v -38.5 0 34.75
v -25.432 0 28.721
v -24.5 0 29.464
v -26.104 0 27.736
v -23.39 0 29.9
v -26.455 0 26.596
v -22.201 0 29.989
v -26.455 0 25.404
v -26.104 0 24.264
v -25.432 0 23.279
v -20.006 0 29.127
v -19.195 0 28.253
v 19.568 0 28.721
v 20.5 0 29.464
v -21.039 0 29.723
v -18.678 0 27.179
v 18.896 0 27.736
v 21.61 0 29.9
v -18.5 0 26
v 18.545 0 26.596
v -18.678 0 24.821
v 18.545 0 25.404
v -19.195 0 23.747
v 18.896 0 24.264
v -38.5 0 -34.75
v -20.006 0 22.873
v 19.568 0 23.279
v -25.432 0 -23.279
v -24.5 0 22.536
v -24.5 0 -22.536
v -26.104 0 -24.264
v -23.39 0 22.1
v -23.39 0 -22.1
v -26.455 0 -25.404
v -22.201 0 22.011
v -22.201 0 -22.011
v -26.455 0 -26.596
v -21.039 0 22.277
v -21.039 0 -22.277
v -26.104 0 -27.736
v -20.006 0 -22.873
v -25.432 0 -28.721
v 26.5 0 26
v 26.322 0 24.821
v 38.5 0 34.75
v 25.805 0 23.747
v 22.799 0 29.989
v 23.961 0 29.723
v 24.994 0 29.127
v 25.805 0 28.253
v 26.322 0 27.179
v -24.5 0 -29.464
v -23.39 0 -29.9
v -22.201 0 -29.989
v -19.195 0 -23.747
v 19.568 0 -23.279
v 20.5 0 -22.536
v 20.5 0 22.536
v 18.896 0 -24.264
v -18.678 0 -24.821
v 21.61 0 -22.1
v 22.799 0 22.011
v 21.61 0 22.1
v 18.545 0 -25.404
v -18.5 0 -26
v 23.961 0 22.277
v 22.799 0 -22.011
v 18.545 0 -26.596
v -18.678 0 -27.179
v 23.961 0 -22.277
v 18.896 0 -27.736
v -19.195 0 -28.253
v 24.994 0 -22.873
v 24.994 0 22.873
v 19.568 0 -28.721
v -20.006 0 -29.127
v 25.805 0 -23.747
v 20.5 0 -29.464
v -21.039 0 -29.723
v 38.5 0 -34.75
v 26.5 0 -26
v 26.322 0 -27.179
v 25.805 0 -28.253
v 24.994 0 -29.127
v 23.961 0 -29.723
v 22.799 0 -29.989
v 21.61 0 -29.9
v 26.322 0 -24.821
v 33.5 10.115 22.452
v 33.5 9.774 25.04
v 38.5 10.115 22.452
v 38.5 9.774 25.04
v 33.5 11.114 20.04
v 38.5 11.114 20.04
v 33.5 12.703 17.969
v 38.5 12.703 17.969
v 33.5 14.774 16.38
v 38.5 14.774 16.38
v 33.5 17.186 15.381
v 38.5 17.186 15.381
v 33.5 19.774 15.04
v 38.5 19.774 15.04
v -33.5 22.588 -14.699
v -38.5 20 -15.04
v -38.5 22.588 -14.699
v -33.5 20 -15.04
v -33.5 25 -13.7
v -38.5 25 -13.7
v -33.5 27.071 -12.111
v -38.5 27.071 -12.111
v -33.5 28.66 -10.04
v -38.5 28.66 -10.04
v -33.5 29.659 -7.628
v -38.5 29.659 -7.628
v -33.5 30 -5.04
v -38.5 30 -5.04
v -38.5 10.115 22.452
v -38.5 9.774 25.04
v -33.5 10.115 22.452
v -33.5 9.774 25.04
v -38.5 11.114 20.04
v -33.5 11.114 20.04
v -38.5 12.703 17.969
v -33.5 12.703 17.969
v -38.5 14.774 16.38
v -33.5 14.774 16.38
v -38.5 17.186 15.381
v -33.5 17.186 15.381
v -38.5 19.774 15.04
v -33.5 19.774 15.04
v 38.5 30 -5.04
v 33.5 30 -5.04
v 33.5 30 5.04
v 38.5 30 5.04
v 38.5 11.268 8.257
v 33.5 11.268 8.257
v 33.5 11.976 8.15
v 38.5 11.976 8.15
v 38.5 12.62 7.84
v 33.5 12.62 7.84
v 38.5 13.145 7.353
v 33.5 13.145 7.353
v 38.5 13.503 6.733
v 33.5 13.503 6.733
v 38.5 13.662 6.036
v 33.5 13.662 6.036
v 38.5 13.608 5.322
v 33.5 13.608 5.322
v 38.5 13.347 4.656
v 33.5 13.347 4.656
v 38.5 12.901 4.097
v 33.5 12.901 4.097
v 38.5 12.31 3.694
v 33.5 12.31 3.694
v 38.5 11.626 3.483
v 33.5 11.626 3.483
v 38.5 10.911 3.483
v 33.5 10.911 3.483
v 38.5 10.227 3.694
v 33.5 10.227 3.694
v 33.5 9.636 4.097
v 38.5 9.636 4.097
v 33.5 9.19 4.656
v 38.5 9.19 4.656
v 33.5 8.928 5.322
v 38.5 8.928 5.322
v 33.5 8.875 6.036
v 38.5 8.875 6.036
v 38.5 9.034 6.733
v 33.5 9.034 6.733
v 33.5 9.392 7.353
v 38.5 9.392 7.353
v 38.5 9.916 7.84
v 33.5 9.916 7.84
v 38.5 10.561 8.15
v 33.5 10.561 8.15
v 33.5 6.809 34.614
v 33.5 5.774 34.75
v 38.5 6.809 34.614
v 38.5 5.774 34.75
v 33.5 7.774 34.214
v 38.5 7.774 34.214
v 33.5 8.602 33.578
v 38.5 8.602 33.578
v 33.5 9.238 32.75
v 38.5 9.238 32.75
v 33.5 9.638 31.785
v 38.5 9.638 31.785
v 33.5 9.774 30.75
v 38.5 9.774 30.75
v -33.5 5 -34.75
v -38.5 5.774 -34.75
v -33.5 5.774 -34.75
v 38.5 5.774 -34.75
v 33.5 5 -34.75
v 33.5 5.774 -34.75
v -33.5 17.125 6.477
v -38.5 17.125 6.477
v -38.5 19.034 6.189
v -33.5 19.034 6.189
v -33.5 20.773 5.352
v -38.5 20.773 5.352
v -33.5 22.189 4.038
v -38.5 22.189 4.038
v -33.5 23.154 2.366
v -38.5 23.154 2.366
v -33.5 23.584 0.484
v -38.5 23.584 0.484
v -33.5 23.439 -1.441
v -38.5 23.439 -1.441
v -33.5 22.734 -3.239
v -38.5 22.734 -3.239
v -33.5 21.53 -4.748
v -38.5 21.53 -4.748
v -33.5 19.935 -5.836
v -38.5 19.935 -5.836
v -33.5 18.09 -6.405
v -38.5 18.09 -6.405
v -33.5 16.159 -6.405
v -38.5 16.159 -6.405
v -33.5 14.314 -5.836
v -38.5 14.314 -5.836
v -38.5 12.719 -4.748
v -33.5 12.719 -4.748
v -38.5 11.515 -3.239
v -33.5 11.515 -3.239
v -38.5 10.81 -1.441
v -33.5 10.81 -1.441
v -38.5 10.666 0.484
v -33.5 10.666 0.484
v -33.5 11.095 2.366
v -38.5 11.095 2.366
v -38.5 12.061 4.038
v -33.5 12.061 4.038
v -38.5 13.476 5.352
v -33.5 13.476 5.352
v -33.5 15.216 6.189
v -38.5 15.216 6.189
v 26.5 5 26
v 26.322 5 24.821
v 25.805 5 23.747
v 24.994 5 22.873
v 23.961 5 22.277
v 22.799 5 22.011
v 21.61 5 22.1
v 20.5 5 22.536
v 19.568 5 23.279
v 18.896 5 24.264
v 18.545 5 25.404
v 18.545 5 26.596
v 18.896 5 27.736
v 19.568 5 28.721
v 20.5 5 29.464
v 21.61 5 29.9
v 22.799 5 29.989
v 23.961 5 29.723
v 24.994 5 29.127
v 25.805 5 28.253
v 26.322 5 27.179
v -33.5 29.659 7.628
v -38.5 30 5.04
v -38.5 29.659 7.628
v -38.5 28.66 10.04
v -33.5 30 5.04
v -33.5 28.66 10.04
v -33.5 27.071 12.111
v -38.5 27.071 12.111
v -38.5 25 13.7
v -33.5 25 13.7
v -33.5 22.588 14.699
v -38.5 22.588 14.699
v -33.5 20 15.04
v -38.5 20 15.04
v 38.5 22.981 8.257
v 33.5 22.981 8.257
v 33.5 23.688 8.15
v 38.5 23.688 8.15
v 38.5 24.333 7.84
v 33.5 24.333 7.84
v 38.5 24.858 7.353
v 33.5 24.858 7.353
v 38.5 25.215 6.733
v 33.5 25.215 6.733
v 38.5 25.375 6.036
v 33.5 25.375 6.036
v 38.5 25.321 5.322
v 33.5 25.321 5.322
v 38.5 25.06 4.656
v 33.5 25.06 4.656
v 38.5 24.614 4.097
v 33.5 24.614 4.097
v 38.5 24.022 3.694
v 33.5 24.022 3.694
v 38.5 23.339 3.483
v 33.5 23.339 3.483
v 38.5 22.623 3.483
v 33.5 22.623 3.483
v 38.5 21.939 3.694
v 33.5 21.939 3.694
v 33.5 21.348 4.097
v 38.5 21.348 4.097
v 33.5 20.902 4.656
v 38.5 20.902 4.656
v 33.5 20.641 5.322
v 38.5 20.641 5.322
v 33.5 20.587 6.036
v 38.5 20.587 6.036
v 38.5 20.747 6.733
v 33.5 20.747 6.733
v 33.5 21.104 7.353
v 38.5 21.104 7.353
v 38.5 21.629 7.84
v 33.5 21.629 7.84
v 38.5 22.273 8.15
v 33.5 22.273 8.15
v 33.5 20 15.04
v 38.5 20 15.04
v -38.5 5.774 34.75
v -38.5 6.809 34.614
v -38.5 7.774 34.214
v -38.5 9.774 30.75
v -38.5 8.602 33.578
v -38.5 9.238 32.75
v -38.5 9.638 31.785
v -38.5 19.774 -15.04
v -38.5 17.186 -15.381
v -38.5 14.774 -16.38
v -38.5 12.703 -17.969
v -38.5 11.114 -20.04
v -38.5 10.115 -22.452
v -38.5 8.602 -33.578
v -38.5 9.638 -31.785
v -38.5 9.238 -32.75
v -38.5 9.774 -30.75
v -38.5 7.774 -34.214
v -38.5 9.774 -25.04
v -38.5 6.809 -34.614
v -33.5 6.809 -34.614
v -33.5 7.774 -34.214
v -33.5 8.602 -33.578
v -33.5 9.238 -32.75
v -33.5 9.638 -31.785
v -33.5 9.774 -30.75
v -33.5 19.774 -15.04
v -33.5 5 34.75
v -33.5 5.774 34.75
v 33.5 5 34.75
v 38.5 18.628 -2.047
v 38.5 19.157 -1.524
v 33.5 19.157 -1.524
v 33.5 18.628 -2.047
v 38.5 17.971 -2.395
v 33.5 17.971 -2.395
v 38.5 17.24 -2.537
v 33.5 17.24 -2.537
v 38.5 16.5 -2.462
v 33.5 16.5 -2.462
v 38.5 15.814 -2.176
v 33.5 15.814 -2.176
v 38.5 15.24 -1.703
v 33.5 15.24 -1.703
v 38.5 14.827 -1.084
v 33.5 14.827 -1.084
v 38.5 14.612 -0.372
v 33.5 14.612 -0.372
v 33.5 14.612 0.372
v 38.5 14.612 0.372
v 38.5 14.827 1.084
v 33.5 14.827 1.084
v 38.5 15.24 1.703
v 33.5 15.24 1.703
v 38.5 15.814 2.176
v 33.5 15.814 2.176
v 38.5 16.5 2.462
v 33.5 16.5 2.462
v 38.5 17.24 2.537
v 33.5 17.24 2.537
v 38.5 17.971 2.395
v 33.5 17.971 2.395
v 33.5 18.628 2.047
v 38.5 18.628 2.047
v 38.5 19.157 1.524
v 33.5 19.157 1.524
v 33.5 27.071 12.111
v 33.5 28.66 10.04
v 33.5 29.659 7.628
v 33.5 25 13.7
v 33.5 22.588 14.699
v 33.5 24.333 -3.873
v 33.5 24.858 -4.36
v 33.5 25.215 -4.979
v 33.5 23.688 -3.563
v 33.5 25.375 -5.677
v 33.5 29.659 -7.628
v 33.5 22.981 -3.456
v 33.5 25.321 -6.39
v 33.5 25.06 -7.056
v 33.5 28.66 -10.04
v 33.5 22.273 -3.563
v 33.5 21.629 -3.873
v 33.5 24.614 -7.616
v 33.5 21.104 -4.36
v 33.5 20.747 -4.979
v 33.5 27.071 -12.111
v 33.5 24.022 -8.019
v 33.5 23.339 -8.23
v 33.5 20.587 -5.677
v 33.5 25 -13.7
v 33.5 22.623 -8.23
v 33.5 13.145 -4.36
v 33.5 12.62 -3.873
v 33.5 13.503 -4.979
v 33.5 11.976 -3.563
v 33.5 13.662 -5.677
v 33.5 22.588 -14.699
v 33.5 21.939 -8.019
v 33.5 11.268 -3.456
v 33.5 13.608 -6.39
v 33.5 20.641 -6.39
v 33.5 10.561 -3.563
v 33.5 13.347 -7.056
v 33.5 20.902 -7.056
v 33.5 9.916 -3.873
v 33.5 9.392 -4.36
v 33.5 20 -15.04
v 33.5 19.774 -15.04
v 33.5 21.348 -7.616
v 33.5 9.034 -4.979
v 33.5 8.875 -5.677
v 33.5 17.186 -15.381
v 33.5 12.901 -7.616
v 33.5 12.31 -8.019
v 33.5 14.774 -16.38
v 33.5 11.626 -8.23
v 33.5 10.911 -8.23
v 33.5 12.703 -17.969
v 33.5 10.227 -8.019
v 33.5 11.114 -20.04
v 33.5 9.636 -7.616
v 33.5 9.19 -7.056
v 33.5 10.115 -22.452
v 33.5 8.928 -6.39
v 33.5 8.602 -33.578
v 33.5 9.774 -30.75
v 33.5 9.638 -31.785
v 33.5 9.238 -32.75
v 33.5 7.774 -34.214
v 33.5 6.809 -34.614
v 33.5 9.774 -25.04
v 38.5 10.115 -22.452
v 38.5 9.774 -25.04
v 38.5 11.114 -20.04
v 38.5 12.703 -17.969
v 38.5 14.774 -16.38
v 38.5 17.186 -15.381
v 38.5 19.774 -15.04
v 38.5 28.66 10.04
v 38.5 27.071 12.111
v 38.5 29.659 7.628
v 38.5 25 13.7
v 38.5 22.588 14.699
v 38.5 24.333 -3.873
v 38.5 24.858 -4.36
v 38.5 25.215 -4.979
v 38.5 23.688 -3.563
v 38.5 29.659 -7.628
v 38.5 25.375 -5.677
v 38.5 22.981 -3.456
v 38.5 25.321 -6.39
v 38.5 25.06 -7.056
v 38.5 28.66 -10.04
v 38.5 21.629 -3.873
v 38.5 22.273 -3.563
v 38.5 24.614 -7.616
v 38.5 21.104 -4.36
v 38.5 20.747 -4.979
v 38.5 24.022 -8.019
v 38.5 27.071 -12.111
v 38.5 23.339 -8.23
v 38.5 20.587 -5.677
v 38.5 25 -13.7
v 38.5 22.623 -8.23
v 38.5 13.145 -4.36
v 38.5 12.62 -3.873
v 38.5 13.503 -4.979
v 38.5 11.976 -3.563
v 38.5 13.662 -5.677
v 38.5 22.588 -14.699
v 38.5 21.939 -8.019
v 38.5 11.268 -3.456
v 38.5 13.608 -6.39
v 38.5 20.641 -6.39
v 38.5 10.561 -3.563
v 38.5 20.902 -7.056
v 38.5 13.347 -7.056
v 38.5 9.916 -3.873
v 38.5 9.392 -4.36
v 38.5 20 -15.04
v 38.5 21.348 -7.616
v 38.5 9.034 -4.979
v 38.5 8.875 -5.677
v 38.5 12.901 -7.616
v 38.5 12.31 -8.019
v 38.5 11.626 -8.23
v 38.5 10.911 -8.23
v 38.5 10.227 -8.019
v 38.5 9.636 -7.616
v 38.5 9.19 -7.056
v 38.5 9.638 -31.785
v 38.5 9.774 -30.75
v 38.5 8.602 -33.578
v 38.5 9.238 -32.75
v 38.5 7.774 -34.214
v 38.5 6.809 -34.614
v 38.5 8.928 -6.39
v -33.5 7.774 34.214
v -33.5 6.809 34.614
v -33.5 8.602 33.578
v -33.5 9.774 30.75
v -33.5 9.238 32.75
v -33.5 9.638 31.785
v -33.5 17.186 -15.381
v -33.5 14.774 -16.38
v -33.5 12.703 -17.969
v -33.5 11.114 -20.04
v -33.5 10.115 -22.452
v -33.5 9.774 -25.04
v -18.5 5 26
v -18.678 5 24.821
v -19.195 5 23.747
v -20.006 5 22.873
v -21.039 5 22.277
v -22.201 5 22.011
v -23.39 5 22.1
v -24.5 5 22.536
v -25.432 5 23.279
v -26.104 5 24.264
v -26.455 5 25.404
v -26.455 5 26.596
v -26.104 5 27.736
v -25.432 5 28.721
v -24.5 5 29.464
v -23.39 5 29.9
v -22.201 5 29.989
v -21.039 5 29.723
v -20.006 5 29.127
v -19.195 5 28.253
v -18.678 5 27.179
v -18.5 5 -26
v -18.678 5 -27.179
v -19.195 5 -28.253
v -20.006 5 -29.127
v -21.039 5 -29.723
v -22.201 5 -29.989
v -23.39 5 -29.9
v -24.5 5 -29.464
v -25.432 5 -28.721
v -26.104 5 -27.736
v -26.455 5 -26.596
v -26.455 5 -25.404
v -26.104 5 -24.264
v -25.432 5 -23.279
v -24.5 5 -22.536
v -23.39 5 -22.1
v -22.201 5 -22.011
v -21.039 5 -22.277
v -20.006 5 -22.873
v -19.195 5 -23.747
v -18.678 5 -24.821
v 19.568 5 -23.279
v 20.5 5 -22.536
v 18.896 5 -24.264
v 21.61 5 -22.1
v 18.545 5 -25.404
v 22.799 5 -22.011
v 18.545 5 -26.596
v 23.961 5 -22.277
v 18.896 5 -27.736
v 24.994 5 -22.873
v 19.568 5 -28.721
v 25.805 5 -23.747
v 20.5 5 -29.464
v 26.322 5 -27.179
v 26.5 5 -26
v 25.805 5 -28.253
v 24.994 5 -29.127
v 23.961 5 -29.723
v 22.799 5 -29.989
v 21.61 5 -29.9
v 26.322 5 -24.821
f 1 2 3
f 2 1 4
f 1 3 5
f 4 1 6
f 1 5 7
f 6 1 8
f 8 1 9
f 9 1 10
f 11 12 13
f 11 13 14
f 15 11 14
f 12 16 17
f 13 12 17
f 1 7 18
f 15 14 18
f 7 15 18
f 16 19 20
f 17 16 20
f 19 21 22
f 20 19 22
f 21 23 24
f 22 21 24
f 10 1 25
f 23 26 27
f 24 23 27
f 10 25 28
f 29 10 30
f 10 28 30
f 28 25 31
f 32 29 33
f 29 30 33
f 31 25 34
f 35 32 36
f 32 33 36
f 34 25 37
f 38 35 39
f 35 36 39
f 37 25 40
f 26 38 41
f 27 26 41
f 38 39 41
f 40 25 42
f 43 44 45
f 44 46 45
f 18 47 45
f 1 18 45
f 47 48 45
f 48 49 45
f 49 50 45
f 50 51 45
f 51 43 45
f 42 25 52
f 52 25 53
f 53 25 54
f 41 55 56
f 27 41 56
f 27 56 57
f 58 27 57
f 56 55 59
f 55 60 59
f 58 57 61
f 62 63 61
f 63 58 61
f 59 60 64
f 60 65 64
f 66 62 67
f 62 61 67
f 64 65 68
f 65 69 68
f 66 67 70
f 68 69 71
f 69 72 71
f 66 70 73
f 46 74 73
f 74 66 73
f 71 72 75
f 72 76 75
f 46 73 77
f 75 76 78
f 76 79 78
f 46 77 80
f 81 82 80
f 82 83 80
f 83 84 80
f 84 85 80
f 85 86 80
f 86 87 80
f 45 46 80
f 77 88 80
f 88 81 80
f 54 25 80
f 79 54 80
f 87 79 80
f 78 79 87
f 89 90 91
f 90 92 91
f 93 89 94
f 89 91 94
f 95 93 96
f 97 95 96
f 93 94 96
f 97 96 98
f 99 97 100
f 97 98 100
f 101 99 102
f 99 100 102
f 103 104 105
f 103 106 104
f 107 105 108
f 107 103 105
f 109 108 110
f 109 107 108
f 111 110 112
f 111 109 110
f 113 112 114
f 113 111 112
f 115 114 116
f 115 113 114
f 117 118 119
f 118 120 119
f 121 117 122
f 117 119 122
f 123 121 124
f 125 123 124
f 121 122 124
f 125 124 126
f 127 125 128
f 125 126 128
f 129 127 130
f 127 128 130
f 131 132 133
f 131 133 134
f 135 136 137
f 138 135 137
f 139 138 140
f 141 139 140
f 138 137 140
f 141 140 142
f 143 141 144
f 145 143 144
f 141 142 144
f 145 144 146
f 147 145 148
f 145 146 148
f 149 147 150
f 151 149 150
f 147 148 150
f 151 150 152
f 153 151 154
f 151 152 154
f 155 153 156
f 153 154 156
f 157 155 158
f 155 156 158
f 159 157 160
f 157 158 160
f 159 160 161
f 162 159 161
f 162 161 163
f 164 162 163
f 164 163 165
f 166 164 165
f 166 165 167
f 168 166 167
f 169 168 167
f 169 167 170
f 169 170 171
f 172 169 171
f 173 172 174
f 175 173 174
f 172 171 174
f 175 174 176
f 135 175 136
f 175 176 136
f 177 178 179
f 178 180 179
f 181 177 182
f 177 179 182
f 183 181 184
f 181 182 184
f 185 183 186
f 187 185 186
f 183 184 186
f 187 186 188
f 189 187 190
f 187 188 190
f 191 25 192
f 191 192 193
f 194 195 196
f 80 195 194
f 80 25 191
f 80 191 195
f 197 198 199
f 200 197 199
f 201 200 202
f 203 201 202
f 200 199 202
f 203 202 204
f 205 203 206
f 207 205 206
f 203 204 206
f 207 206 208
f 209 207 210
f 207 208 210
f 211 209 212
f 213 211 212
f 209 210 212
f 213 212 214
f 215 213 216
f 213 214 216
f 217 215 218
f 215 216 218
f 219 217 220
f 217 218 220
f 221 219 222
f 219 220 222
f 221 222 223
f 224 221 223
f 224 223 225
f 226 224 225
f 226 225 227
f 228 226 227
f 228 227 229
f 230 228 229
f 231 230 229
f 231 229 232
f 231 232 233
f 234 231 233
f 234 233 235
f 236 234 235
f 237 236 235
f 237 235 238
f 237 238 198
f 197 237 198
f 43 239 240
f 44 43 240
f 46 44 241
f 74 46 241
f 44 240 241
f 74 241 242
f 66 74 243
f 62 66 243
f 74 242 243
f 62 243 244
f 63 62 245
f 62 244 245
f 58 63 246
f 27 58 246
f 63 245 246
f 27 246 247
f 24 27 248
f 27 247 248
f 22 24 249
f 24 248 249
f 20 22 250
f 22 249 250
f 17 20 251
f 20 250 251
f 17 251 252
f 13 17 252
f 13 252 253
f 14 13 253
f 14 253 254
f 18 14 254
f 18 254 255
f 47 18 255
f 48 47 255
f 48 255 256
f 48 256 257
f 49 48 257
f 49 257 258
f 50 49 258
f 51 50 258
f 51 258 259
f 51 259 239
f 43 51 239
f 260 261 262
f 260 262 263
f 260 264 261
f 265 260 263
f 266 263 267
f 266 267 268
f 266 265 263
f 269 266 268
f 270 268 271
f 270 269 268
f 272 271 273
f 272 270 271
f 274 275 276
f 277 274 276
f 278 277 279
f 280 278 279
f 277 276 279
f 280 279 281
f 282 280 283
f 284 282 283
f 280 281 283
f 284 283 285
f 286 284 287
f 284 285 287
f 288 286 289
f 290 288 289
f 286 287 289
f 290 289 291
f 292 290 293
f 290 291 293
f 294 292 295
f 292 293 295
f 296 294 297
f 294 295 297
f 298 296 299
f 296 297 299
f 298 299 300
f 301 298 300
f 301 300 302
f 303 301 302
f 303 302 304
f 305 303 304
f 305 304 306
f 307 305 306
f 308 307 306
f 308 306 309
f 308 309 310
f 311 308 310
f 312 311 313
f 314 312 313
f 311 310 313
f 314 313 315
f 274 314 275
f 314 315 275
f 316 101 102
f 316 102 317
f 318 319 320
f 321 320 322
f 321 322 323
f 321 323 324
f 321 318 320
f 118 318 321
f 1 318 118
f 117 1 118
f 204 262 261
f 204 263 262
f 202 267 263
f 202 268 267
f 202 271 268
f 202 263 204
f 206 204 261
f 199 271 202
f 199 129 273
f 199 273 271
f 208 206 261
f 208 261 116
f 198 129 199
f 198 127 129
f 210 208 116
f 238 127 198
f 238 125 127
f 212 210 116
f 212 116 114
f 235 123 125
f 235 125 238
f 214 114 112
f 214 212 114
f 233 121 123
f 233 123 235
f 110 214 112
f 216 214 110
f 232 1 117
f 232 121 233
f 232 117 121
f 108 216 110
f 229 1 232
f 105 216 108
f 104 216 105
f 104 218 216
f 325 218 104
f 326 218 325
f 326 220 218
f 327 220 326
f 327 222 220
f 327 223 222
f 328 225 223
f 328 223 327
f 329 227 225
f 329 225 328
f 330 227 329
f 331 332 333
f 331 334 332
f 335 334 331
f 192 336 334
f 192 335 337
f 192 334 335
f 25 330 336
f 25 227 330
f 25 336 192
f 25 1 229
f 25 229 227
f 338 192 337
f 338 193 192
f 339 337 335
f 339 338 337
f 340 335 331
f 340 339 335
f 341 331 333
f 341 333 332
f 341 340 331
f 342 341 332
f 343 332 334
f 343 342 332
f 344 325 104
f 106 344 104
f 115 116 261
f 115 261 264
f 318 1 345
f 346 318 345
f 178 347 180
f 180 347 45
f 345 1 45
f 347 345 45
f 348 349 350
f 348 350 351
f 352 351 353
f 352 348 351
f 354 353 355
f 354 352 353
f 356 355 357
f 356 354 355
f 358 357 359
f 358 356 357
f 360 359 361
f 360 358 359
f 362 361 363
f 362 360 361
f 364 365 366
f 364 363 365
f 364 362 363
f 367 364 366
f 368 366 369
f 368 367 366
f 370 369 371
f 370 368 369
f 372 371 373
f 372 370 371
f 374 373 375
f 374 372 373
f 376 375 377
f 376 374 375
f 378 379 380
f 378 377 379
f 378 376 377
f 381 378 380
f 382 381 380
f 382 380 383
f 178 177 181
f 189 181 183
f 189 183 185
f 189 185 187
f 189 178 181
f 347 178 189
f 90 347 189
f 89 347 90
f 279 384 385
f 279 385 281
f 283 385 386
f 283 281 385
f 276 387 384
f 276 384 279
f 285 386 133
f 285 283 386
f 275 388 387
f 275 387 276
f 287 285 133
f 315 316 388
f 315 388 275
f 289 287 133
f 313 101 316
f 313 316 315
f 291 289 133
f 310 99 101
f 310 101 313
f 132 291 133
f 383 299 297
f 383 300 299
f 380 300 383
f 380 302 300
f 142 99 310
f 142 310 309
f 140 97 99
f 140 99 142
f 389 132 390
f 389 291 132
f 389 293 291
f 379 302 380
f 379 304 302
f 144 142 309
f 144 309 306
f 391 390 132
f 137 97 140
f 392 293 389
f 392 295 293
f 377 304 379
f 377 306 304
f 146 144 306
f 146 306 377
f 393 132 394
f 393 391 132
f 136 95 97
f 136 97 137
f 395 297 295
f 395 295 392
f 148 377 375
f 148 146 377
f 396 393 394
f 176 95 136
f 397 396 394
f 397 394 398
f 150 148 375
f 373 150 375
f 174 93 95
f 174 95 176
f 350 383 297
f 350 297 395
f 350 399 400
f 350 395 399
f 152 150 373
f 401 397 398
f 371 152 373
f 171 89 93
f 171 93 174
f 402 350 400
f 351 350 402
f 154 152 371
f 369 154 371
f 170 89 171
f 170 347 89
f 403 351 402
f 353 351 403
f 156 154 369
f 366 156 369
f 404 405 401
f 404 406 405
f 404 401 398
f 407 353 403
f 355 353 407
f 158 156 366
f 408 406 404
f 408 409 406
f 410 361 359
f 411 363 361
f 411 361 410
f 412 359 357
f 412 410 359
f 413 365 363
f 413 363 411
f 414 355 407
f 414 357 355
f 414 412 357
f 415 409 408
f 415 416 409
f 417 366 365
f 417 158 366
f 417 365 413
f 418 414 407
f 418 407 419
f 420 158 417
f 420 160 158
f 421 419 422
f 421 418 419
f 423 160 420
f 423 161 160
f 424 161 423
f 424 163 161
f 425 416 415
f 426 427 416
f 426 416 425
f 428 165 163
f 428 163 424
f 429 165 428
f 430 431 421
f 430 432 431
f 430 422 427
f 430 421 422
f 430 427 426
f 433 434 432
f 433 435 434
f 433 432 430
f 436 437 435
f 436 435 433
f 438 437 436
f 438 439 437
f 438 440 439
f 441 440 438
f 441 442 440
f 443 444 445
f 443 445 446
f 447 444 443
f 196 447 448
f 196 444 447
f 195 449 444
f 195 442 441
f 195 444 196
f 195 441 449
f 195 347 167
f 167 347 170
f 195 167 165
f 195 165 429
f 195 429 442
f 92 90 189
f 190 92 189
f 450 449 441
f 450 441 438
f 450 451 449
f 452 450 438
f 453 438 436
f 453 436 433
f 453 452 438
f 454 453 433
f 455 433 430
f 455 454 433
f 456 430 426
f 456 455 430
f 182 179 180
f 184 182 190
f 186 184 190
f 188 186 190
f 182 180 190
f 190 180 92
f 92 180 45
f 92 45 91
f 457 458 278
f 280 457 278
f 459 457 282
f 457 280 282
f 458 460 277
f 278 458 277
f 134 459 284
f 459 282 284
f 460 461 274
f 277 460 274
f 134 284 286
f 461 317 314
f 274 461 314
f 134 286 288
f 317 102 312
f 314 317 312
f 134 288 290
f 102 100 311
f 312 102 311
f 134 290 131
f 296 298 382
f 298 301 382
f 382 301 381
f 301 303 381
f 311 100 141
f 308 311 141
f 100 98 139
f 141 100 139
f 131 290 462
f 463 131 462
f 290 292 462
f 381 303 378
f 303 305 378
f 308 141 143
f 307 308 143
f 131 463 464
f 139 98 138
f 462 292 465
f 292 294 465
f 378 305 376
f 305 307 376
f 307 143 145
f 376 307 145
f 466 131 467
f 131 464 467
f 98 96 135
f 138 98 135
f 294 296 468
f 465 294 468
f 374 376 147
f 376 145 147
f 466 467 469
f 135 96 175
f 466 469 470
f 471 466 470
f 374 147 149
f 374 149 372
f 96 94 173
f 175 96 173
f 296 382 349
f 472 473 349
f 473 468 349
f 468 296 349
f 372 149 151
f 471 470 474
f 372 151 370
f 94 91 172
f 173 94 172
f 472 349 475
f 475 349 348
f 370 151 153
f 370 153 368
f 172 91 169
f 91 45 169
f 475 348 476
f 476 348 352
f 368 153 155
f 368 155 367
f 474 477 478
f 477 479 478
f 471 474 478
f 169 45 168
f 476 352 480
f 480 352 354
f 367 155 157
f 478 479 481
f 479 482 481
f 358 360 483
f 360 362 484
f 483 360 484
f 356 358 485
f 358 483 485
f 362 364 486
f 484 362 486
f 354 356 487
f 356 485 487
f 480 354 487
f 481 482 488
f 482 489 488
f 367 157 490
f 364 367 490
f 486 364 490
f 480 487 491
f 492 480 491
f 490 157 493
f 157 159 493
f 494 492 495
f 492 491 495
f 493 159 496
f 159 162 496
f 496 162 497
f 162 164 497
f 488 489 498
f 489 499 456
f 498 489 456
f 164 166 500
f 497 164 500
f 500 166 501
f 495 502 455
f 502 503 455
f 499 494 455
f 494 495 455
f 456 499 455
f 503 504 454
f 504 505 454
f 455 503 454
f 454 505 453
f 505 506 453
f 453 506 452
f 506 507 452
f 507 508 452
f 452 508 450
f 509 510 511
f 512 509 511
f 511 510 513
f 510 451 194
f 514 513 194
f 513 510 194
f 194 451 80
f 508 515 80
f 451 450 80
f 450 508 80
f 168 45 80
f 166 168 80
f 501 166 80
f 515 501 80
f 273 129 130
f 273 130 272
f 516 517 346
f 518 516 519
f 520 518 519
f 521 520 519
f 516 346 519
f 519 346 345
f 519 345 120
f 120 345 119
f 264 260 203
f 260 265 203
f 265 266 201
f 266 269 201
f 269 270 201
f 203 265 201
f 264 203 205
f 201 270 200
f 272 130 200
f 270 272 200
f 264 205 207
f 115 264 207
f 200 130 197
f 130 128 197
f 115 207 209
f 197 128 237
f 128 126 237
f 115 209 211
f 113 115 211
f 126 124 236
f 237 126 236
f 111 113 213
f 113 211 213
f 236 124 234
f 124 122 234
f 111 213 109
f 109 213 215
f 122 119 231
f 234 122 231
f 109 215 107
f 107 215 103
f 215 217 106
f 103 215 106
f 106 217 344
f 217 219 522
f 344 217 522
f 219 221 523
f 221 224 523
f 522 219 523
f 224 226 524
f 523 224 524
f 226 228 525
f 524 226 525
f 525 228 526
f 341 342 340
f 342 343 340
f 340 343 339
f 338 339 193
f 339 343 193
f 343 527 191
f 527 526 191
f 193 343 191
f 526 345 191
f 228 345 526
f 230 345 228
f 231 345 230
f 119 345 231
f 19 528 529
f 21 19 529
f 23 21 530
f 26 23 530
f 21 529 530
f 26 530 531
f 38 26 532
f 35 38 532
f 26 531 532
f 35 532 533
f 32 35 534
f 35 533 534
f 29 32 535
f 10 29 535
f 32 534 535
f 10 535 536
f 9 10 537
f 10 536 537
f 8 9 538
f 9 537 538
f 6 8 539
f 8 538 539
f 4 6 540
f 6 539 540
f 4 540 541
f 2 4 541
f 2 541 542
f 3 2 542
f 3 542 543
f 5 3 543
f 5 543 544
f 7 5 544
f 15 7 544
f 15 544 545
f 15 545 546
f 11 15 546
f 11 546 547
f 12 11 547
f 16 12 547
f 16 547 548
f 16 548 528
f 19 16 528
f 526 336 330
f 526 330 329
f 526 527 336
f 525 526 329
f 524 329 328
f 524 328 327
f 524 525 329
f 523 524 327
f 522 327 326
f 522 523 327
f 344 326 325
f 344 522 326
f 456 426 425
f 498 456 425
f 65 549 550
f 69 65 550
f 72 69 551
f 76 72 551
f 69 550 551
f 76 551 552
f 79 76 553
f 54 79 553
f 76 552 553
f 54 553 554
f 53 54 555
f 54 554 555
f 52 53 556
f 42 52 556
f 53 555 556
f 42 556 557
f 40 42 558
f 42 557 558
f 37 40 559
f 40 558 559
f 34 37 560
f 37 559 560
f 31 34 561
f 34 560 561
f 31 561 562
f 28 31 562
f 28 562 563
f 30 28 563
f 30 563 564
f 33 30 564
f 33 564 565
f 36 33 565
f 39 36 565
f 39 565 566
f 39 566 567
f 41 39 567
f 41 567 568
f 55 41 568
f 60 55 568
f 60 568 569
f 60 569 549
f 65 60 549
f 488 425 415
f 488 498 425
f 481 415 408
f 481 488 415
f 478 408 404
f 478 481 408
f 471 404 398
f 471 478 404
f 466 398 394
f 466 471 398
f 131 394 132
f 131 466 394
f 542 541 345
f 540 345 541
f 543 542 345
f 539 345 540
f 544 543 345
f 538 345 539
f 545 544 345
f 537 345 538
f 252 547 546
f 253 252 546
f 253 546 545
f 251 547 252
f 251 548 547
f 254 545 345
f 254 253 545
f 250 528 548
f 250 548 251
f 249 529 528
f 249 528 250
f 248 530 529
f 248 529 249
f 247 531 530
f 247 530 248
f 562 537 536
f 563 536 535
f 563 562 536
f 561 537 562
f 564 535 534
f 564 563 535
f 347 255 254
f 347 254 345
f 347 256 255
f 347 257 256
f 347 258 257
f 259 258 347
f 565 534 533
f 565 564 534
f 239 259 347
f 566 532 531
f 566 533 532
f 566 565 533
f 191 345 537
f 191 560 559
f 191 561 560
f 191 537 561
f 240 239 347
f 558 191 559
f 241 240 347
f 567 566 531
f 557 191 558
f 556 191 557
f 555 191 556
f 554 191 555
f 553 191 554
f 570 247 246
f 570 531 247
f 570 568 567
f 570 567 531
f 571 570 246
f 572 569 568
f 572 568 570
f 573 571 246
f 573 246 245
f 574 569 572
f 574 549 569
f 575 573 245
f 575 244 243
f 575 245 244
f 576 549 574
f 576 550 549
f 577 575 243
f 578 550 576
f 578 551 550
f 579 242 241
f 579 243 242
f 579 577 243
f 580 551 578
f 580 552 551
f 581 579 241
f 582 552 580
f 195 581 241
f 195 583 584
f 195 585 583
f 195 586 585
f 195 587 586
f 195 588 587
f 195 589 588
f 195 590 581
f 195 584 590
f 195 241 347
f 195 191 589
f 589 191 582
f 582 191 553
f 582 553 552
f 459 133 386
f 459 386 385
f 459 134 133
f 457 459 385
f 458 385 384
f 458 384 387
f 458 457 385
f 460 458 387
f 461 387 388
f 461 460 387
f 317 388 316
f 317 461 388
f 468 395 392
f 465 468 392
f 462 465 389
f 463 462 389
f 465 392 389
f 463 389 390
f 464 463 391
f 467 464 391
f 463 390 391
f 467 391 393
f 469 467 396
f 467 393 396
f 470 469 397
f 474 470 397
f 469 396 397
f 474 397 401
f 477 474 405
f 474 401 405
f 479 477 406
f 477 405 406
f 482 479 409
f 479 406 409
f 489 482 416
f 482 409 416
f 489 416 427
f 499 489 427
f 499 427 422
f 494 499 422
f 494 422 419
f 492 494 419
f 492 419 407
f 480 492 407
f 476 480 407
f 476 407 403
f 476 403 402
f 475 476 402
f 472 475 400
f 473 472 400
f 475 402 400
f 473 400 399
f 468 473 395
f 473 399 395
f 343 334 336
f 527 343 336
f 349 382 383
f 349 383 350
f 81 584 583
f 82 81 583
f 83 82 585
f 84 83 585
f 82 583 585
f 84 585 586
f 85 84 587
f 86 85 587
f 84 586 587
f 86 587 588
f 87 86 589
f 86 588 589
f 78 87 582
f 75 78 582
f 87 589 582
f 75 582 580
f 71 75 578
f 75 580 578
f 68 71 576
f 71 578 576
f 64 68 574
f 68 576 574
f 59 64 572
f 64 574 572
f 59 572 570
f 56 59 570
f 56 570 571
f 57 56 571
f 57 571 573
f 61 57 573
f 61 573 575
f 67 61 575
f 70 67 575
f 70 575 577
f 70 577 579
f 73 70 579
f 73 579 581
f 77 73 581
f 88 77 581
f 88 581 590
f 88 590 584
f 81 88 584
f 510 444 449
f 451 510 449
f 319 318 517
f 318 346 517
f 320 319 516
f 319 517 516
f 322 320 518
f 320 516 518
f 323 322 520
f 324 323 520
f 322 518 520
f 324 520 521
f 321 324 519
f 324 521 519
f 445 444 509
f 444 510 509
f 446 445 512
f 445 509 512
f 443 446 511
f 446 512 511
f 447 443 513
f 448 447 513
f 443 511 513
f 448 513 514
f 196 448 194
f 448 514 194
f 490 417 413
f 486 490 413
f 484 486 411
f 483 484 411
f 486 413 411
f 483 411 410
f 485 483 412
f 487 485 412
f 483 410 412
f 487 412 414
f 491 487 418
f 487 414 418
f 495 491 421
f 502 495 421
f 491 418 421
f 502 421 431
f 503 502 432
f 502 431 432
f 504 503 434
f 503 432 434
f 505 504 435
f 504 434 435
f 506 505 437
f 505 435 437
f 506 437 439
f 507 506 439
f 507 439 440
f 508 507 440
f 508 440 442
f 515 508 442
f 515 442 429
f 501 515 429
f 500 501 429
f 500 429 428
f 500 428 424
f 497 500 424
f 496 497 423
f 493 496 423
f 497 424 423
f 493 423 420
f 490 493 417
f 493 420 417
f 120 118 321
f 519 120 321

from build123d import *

# Parameters (mm, degrees)
SKETCH1_W             = 5
SKETCH1_H             = 69.5
BOSS_EXTRUDE1_DEPTH   = 30
BOSS_EXTRUDE1_2_DEPTH = 30
SKETCH1_4_W           = 67
SKETCH1_4_H           = 69.5
BOSS_EXTRUDE3_DEPTH   = 5
SKETCH2_R             = 6.477
CUT_EXTRUDE1_DEPTH    = 34
SKETCH3_R             = 4
CUT_EXTRUDE2_DEPTH    = 119
CUT_EXTRUDE3_DEPTH    = 14
SKETCH9_W             = 19.710117916
SKETCH9_H             = 20.225929664
CUT_EXTRUDE4_DEPTH    = 113
FILLET1_R             = 10
FILLET2_R             = 4
SKETCH11_R            = 2.4003
CUT_EXTRUDE5_DEPTH    = 5


with BuildPart() as part:
    # Sketch1 → Boss-Extrude1 (new body)
    with BuildSketch(Plane(origin=(0, 0, 0), x_dir=(1, 0, 0), z_dir=(0, 1, 0))):
        with Locations((-36, 0)):
            Rectangle(SKETCH1_W, SKETCH1_H)
    extrude(amount=BOSS_EXTRUDE1_DEPTH)



with BuildPart() as body_2:
    # Sketch1 → Boss-Extrude1 2 (new body)
    with BuildSketch(Plane(origin=(0, 0, 0), x_dir=(1, 0, 0), z_dir=(0, 1, 0))):
        with Locations((36, 0)):
            Rectangle(SKETCH1_W, SKETCH1_H)
    extrude(amount=BOSS_EXTRUDE1_2_DEPTH)


with BuildPart() as part_1:
    add(part.part)

    add(body_2.part)  # Boss-Extrude3 merges body 2
    # Sketch1<4> → Boss-Extrude3 (add)
    with BuildSketch(Plane(origin=(0, 0, 0), x_dir=(1, 0, 0), z_dir=(0, 1, 0))):
        Rectangle(SKETCH1_4_W, SKETCH1_4_H)
    extrude(amount=BOSS_EXTRUDE3_DEPTH)

    # Sketch2 → Cut-Extrude1 (cut)
    with BuildSketch(Plane.ZY.offset(38.5)):
        with Locations((0, 17.124630649)):
            Circle(SKETCH2_R)
    extrude(amount=-CUT_EXTRUDE1_DEPTH, mode=Mode.SUBTRACT)

    # Sketch3 → Cut-Extrude2 (cut)
    with BuildSketch(Plane(origin=(0, 5, 0), x_dir=(1, 0, 0), z_dir=(0, 1, 0))):
        with Locations((-22.5, 26)):
            Circle(SKETCH3_R)
        with Locations((-22.5, -26)):
            Circle(SKETCH3_R)
        with Locations((22.5, 26)):
            Circle(SKETCH3_R)
        with Locations((22.5, -26)):
            Circle(SKETCH3_R)
    extrude(amount=-CUT_EXTRUDE2_DEPTH, mode=Mode.SUBTRACT)

    # Sketch8 → Cut-Extrude3 (cut)
    with BuildSketch(Plane(origin=(38.5, 0, 0), x_dir=(0, 0, -1), z_dir=(1, 0, 0))):
        with BuildLine():
            Line((-1.524, 19.156630649), (1.524, 19.156630649))
            ThreePointArc((1.524, 19.156630649), (0, 14.584630649), (-1.524, 19.156630649))
        make_face()
    extrude(amount=-CUT_EXTRUDE3_DEPTH, mode=Mode.SUBTRACT)

    # Sketch9 → Cut-Extrude4 (cut)
    with BuildSketch(Plane.ZY.offset(38.5)):
        with Locations((-24.894941042, 19.887035168)):
            Rectangle(SKETCH9_W, SKETCH9_H)
        with Locations((24.894941042, 19.887035168)):
            Rectangle(SKETCH9_W, SKETCH9_H)
    extrude(amount=-CUT_EXTRUDE4_DEPTH, mode=Mode.SUBTRACT)

    # Fillet1
    fillet1_edges = [part_1.edges().sort_by_distance(p)[0] for p in [
        (36, 9.774070336, -15.039882084),
        (-36, 30, -15.039882084),
        (-36, 9.774070336, -15.039882084),
        (36, 9.774070336, 15.039882084),
        (-36, 9.774070336, 15.039882084),
        (-36, 30, 15.039882084),
        (36, 30, 15.039882084),
        (36, 30, -15.039882084),
    ]]
    fillet(fillet1_edges, radius=FILLET1_R)

    # Fillet2
    fillet2_edges = [part_1.edges().sort_by_distance(p)[0] for p in [
        (36, 9.774070336, -34.75),
        (-36, 9.774070336, -34.75),
        (36, 9.774070336, 34.75),
        (-36, 9.774070336, 34.75),
    ]]
    fillet(fillet2_edges, radius=FILLET2_R)

    # Sketch11 → Cut-Extrude5 (cut)
    with BuildSketch(Plane.ZY.offset(-33.5)):
        with Locations((-5.856308805, 22.980939454)):
            Circle(SKETCH11_R)
        with Locations((5.856308805, 22.980939454)):
            Circle(SKETCH11_R)
        with Locations((-5.856308805, 11.268321844)):
            Circle(SKETCH11_R)
        with Locations((5.856308805, 11.268321844)):
            Circle(SKETCH11_R)
    extrude(amount=-CUT_EXTRUDE5_DEPTH, mode=Mode.SUBTRACT)


solid = part_1.part
